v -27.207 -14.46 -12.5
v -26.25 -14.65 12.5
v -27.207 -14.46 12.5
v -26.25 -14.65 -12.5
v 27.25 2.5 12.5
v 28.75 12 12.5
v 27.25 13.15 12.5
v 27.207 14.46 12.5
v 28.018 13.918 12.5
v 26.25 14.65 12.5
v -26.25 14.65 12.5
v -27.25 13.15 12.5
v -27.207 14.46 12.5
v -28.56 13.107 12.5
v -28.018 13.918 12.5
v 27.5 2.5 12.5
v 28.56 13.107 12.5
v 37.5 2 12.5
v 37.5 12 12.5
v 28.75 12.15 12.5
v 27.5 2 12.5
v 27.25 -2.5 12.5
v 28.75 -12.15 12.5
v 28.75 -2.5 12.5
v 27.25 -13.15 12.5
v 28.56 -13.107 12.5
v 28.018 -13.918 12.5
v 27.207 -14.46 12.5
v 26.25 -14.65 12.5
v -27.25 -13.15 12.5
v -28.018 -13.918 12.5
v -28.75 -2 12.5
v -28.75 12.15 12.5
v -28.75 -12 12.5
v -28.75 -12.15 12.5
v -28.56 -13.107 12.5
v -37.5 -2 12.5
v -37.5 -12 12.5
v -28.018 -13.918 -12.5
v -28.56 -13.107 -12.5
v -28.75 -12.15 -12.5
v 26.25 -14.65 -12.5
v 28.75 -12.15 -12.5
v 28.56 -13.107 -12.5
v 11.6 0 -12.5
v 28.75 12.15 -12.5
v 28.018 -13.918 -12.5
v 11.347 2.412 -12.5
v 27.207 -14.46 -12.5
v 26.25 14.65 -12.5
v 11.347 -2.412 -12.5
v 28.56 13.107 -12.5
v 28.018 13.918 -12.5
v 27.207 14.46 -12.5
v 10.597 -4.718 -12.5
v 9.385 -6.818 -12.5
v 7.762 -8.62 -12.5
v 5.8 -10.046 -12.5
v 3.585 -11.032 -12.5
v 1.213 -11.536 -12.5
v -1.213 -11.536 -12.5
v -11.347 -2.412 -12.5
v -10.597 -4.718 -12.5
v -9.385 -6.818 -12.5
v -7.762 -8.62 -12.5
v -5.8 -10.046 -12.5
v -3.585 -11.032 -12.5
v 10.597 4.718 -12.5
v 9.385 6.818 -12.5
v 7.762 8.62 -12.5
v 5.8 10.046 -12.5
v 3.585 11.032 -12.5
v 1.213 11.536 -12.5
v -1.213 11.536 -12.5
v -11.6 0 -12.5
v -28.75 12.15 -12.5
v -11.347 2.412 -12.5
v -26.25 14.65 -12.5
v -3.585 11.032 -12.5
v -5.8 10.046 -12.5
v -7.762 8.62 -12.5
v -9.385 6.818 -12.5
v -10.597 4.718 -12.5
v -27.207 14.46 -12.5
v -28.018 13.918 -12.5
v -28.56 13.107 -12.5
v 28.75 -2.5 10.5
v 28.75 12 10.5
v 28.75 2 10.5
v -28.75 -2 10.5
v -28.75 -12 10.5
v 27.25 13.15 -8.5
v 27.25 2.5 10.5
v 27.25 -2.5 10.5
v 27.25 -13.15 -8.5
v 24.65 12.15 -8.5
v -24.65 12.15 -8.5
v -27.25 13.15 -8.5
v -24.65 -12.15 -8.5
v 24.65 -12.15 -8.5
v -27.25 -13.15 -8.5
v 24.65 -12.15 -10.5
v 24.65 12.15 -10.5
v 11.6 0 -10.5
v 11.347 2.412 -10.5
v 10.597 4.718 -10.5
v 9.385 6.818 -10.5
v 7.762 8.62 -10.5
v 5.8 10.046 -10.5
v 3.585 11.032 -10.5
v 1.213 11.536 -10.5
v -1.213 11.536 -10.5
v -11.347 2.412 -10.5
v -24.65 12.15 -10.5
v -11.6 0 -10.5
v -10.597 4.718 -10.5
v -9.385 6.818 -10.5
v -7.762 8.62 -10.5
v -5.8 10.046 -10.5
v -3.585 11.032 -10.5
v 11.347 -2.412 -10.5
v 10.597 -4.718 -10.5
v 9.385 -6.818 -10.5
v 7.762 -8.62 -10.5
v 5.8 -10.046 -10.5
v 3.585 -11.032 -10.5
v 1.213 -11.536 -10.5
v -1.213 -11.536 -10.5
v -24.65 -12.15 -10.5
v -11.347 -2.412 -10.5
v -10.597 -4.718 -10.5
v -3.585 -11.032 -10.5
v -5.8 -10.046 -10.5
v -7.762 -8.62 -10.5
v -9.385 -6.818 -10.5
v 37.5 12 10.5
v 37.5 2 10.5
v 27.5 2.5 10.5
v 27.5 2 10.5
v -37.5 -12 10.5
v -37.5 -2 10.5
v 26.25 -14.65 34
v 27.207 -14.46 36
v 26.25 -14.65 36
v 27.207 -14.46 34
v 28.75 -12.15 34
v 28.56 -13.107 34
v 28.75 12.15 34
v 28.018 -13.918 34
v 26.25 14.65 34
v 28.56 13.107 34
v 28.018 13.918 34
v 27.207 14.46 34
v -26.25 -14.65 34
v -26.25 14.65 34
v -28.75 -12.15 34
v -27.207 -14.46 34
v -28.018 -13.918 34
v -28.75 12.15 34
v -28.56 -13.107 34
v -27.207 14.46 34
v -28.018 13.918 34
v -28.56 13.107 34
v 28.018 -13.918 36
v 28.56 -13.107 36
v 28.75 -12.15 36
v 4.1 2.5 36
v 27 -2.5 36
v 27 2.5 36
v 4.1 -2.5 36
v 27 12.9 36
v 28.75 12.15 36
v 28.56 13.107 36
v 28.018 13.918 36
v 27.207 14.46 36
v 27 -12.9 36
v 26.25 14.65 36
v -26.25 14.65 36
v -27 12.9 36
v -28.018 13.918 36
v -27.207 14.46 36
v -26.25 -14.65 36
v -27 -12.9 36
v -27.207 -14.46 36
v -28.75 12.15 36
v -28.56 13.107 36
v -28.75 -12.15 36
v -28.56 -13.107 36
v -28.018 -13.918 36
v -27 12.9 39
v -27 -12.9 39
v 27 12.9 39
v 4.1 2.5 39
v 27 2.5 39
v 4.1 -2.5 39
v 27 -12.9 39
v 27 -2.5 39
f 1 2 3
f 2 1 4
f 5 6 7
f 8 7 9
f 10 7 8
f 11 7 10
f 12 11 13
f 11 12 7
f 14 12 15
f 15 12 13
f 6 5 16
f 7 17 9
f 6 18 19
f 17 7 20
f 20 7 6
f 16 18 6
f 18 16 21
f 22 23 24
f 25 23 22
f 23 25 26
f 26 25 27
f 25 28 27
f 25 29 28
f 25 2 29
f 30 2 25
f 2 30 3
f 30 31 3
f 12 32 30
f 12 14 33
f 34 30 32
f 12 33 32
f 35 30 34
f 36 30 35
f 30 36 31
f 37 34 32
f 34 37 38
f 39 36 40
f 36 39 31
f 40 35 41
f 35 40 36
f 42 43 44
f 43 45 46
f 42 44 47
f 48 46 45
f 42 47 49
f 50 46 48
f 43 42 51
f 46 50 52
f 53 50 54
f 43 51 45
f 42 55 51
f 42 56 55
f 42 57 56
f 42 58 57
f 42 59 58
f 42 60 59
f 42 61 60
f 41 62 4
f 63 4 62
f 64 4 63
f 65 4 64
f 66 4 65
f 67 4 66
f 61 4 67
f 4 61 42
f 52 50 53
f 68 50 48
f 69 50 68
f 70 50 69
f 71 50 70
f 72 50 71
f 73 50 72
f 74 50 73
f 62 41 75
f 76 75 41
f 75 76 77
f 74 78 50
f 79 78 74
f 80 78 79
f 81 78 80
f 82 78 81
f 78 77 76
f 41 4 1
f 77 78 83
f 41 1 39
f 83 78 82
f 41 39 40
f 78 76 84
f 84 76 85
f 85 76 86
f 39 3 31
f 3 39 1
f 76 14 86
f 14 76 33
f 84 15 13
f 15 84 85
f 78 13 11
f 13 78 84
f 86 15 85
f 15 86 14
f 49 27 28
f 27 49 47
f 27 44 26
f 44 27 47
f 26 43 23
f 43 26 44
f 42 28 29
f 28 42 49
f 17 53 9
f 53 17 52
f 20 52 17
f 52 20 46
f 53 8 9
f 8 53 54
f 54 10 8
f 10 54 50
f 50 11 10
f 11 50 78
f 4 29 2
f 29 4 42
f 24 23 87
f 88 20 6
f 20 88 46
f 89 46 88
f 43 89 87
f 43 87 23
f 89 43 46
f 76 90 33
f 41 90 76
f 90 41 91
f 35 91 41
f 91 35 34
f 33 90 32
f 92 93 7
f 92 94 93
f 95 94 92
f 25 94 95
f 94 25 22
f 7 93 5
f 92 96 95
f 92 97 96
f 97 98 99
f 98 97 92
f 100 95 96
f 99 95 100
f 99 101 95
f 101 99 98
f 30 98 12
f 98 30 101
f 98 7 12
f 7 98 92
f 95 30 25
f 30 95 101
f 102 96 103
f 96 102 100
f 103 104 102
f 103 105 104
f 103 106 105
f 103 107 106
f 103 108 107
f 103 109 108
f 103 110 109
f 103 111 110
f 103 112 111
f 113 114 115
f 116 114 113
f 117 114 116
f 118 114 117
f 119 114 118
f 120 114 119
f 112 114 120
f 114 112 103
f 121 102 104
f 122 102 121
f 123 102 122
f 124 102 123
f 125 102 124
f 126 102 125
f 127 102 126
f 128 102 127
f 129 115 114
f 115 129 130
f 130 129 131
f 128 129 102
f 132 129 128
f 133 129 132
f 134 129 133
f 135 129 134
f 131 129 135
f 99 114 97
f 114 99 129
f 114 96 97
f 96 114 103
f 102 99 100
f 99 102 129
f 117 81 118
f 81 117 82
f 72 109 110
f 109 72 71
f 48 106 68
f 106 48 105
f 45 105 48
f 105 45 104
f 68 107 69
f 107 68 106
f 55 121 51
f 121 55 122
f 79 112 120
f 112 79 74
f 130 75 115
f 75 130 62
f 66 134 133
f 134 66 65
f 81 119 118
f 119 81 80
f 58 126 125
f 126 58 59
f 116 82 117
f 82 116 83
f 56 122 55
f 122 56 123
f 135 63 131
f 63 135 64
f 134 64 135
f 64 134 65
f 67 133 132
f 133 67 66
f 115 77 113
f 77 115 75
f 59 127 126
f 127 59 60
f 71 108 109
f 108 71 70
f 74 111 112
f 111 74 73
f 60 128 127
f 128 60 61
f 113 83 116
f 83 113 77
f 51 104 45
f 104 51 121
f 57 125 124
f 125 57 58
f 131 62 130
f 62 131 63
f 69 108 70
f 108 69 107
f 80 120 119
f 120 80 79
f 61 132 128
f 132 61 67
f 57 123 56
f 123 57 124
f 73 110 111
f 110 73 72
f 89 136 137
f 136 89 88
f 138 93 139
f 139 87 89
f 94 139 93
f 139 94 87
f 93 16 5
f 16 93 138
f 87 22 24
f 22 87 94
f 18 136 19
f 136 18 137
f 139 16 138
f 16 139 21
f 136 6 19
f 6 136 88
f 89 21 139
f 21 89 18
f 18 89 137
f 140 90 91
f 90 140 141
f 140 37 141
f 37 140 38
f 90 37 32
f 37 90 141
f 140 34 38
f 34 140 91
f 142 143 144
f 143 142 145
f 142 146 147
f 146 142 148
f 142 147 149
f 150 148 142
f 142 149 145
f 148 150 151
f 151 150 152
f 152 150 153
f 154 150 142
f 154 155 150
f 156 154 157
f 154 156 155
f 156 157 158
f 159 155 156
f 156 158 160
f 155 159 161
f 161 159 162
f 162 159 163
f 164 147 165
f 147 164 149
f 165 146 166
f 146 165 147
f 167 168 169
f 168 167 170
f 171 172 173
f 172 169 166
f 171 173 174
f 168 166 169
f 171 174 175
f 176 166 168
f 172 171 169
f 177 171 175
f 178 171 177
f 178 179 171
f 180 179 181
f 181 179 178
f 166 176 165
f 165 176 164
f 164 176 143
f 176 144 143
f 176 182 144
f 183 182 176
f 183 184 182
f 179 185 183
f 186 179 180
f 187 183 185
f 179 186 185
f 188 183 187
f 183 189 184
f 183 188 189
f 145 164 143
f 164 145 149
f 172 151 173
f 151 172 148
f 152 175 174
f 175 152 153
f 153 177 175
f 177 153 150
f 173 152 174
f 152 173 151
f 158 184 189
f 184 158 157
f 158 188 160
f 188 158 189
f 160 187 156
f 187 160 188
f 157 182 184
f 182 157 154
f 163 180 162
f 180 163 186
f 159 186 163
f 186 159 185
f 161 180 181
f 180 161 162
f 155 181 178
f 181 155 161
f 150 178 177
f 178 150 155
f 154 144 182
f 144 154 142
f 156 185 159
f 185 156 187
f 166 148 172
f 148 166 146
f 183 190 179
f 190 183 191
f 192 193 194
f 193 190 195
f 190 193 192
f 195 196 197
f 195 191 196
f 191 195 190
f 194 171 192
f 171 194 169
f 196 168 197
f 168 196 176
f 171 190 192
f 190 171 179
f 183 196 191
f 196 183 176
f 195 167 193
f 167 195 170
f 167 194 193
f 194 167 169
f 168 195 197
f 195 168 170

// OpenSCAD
$fs=1;

ORB_D=22.2;
BOX_W=23.3;
BOARD_W=32.5;
BOARD_H=24.3;
MOUNT_SEP=29;

CLEARANCE=1;

ENCLOSURE_HEIGHT=25;
FRONT_THICK=4;
BOX_DEPTH=2;

OVERSIZE = 20;

STAKE_LENGTH=40;

box();
translate([0,0,ENCLOSURE_HEIGHT+10])
rotate([0,180,0])
    lid();

module box() {
    union () {

        translate([BOARD_W - 5, 2, 10.5])
            cube([10,10,2]);
        
        translate([-BOARD_W - 5, -12, 10.5])
            cube([10,10,2]);
        
        difference() {
            roundedCube(BOARD_W+ OVERSIZE + 5, BOARD_H+5, ENCLOSURE_HEIGHT, 5);
            
            translate([0,0,FRONT_THICK])
                cube([BOARD_W+2 + OVERSIZE, BOARD_H+2,ENCLOSURE_HEIGHT], center=true);
            
            translate([0,0,FRONT_THICK-BOX_DEPTH])
                cube([BOX_W+CLEARANCE + OVERSIZE + 5,BOX_W+CLEARANCE,ENCLOSURE_HEIGHT], center=true);

            cylinder(d=ORB_D+CLEARANCE, h=ENCLOSURE_HEIGHT+1, center=true);
            
            translate([(BOARD_W + OVERSIZE + 5) / 2,-(BOARD_H)*0,ENCLOSURE_HEIGHT-2])
                cube([5,5,ENCLOSURE_HEIGHT], center=true);
        }
    }
}

/*    
    translate([0,-(STAKE_LENGTH/2)-(BOARD_H+5)/2,-ENCLOSURE_HEIGHT/2+1.5])

    union() {
        cube([6,STAKE_LENGTH,3], center=true);
        translate([0,-STAKE_LENGTH/2,0])
        scale([1,3,1])
        rotate([0,0,45])
            cube([6/1.414,6/1.414,3], center=true);
    }
    */

    

module lid() {
    union() {
        roundedCube(BOARD_W+OVERSIZE+5, BOARD_H+5, 2, 5);
        translate([0,0,-2.5])
            difference() {
                cube([BOARD_W+OVERSIZE+1.5, BOARD_H+1.5, 3], center=true);
                translate([-BOARD_W / 2,BOARD_H*0,0])
                    cube([BOARD_H,5,3.5], center=true);
            }

    }
}

module roundedCube(x, y, z, rounding) {
    
    cylX = (x-rounding)/2;
    cylY = (y-rounding)/2;
    
    union() {
        cube([x-rounding, y, z], center=true);
        cube([x, y-rounding, z], center=true);
        
        for(a=[-cylX, cylX])
            for(b=[-cylY, cylY])
                translate([a,b,0])
                    cylinder(d=rounding,h=z, center=true);
        }
    }
